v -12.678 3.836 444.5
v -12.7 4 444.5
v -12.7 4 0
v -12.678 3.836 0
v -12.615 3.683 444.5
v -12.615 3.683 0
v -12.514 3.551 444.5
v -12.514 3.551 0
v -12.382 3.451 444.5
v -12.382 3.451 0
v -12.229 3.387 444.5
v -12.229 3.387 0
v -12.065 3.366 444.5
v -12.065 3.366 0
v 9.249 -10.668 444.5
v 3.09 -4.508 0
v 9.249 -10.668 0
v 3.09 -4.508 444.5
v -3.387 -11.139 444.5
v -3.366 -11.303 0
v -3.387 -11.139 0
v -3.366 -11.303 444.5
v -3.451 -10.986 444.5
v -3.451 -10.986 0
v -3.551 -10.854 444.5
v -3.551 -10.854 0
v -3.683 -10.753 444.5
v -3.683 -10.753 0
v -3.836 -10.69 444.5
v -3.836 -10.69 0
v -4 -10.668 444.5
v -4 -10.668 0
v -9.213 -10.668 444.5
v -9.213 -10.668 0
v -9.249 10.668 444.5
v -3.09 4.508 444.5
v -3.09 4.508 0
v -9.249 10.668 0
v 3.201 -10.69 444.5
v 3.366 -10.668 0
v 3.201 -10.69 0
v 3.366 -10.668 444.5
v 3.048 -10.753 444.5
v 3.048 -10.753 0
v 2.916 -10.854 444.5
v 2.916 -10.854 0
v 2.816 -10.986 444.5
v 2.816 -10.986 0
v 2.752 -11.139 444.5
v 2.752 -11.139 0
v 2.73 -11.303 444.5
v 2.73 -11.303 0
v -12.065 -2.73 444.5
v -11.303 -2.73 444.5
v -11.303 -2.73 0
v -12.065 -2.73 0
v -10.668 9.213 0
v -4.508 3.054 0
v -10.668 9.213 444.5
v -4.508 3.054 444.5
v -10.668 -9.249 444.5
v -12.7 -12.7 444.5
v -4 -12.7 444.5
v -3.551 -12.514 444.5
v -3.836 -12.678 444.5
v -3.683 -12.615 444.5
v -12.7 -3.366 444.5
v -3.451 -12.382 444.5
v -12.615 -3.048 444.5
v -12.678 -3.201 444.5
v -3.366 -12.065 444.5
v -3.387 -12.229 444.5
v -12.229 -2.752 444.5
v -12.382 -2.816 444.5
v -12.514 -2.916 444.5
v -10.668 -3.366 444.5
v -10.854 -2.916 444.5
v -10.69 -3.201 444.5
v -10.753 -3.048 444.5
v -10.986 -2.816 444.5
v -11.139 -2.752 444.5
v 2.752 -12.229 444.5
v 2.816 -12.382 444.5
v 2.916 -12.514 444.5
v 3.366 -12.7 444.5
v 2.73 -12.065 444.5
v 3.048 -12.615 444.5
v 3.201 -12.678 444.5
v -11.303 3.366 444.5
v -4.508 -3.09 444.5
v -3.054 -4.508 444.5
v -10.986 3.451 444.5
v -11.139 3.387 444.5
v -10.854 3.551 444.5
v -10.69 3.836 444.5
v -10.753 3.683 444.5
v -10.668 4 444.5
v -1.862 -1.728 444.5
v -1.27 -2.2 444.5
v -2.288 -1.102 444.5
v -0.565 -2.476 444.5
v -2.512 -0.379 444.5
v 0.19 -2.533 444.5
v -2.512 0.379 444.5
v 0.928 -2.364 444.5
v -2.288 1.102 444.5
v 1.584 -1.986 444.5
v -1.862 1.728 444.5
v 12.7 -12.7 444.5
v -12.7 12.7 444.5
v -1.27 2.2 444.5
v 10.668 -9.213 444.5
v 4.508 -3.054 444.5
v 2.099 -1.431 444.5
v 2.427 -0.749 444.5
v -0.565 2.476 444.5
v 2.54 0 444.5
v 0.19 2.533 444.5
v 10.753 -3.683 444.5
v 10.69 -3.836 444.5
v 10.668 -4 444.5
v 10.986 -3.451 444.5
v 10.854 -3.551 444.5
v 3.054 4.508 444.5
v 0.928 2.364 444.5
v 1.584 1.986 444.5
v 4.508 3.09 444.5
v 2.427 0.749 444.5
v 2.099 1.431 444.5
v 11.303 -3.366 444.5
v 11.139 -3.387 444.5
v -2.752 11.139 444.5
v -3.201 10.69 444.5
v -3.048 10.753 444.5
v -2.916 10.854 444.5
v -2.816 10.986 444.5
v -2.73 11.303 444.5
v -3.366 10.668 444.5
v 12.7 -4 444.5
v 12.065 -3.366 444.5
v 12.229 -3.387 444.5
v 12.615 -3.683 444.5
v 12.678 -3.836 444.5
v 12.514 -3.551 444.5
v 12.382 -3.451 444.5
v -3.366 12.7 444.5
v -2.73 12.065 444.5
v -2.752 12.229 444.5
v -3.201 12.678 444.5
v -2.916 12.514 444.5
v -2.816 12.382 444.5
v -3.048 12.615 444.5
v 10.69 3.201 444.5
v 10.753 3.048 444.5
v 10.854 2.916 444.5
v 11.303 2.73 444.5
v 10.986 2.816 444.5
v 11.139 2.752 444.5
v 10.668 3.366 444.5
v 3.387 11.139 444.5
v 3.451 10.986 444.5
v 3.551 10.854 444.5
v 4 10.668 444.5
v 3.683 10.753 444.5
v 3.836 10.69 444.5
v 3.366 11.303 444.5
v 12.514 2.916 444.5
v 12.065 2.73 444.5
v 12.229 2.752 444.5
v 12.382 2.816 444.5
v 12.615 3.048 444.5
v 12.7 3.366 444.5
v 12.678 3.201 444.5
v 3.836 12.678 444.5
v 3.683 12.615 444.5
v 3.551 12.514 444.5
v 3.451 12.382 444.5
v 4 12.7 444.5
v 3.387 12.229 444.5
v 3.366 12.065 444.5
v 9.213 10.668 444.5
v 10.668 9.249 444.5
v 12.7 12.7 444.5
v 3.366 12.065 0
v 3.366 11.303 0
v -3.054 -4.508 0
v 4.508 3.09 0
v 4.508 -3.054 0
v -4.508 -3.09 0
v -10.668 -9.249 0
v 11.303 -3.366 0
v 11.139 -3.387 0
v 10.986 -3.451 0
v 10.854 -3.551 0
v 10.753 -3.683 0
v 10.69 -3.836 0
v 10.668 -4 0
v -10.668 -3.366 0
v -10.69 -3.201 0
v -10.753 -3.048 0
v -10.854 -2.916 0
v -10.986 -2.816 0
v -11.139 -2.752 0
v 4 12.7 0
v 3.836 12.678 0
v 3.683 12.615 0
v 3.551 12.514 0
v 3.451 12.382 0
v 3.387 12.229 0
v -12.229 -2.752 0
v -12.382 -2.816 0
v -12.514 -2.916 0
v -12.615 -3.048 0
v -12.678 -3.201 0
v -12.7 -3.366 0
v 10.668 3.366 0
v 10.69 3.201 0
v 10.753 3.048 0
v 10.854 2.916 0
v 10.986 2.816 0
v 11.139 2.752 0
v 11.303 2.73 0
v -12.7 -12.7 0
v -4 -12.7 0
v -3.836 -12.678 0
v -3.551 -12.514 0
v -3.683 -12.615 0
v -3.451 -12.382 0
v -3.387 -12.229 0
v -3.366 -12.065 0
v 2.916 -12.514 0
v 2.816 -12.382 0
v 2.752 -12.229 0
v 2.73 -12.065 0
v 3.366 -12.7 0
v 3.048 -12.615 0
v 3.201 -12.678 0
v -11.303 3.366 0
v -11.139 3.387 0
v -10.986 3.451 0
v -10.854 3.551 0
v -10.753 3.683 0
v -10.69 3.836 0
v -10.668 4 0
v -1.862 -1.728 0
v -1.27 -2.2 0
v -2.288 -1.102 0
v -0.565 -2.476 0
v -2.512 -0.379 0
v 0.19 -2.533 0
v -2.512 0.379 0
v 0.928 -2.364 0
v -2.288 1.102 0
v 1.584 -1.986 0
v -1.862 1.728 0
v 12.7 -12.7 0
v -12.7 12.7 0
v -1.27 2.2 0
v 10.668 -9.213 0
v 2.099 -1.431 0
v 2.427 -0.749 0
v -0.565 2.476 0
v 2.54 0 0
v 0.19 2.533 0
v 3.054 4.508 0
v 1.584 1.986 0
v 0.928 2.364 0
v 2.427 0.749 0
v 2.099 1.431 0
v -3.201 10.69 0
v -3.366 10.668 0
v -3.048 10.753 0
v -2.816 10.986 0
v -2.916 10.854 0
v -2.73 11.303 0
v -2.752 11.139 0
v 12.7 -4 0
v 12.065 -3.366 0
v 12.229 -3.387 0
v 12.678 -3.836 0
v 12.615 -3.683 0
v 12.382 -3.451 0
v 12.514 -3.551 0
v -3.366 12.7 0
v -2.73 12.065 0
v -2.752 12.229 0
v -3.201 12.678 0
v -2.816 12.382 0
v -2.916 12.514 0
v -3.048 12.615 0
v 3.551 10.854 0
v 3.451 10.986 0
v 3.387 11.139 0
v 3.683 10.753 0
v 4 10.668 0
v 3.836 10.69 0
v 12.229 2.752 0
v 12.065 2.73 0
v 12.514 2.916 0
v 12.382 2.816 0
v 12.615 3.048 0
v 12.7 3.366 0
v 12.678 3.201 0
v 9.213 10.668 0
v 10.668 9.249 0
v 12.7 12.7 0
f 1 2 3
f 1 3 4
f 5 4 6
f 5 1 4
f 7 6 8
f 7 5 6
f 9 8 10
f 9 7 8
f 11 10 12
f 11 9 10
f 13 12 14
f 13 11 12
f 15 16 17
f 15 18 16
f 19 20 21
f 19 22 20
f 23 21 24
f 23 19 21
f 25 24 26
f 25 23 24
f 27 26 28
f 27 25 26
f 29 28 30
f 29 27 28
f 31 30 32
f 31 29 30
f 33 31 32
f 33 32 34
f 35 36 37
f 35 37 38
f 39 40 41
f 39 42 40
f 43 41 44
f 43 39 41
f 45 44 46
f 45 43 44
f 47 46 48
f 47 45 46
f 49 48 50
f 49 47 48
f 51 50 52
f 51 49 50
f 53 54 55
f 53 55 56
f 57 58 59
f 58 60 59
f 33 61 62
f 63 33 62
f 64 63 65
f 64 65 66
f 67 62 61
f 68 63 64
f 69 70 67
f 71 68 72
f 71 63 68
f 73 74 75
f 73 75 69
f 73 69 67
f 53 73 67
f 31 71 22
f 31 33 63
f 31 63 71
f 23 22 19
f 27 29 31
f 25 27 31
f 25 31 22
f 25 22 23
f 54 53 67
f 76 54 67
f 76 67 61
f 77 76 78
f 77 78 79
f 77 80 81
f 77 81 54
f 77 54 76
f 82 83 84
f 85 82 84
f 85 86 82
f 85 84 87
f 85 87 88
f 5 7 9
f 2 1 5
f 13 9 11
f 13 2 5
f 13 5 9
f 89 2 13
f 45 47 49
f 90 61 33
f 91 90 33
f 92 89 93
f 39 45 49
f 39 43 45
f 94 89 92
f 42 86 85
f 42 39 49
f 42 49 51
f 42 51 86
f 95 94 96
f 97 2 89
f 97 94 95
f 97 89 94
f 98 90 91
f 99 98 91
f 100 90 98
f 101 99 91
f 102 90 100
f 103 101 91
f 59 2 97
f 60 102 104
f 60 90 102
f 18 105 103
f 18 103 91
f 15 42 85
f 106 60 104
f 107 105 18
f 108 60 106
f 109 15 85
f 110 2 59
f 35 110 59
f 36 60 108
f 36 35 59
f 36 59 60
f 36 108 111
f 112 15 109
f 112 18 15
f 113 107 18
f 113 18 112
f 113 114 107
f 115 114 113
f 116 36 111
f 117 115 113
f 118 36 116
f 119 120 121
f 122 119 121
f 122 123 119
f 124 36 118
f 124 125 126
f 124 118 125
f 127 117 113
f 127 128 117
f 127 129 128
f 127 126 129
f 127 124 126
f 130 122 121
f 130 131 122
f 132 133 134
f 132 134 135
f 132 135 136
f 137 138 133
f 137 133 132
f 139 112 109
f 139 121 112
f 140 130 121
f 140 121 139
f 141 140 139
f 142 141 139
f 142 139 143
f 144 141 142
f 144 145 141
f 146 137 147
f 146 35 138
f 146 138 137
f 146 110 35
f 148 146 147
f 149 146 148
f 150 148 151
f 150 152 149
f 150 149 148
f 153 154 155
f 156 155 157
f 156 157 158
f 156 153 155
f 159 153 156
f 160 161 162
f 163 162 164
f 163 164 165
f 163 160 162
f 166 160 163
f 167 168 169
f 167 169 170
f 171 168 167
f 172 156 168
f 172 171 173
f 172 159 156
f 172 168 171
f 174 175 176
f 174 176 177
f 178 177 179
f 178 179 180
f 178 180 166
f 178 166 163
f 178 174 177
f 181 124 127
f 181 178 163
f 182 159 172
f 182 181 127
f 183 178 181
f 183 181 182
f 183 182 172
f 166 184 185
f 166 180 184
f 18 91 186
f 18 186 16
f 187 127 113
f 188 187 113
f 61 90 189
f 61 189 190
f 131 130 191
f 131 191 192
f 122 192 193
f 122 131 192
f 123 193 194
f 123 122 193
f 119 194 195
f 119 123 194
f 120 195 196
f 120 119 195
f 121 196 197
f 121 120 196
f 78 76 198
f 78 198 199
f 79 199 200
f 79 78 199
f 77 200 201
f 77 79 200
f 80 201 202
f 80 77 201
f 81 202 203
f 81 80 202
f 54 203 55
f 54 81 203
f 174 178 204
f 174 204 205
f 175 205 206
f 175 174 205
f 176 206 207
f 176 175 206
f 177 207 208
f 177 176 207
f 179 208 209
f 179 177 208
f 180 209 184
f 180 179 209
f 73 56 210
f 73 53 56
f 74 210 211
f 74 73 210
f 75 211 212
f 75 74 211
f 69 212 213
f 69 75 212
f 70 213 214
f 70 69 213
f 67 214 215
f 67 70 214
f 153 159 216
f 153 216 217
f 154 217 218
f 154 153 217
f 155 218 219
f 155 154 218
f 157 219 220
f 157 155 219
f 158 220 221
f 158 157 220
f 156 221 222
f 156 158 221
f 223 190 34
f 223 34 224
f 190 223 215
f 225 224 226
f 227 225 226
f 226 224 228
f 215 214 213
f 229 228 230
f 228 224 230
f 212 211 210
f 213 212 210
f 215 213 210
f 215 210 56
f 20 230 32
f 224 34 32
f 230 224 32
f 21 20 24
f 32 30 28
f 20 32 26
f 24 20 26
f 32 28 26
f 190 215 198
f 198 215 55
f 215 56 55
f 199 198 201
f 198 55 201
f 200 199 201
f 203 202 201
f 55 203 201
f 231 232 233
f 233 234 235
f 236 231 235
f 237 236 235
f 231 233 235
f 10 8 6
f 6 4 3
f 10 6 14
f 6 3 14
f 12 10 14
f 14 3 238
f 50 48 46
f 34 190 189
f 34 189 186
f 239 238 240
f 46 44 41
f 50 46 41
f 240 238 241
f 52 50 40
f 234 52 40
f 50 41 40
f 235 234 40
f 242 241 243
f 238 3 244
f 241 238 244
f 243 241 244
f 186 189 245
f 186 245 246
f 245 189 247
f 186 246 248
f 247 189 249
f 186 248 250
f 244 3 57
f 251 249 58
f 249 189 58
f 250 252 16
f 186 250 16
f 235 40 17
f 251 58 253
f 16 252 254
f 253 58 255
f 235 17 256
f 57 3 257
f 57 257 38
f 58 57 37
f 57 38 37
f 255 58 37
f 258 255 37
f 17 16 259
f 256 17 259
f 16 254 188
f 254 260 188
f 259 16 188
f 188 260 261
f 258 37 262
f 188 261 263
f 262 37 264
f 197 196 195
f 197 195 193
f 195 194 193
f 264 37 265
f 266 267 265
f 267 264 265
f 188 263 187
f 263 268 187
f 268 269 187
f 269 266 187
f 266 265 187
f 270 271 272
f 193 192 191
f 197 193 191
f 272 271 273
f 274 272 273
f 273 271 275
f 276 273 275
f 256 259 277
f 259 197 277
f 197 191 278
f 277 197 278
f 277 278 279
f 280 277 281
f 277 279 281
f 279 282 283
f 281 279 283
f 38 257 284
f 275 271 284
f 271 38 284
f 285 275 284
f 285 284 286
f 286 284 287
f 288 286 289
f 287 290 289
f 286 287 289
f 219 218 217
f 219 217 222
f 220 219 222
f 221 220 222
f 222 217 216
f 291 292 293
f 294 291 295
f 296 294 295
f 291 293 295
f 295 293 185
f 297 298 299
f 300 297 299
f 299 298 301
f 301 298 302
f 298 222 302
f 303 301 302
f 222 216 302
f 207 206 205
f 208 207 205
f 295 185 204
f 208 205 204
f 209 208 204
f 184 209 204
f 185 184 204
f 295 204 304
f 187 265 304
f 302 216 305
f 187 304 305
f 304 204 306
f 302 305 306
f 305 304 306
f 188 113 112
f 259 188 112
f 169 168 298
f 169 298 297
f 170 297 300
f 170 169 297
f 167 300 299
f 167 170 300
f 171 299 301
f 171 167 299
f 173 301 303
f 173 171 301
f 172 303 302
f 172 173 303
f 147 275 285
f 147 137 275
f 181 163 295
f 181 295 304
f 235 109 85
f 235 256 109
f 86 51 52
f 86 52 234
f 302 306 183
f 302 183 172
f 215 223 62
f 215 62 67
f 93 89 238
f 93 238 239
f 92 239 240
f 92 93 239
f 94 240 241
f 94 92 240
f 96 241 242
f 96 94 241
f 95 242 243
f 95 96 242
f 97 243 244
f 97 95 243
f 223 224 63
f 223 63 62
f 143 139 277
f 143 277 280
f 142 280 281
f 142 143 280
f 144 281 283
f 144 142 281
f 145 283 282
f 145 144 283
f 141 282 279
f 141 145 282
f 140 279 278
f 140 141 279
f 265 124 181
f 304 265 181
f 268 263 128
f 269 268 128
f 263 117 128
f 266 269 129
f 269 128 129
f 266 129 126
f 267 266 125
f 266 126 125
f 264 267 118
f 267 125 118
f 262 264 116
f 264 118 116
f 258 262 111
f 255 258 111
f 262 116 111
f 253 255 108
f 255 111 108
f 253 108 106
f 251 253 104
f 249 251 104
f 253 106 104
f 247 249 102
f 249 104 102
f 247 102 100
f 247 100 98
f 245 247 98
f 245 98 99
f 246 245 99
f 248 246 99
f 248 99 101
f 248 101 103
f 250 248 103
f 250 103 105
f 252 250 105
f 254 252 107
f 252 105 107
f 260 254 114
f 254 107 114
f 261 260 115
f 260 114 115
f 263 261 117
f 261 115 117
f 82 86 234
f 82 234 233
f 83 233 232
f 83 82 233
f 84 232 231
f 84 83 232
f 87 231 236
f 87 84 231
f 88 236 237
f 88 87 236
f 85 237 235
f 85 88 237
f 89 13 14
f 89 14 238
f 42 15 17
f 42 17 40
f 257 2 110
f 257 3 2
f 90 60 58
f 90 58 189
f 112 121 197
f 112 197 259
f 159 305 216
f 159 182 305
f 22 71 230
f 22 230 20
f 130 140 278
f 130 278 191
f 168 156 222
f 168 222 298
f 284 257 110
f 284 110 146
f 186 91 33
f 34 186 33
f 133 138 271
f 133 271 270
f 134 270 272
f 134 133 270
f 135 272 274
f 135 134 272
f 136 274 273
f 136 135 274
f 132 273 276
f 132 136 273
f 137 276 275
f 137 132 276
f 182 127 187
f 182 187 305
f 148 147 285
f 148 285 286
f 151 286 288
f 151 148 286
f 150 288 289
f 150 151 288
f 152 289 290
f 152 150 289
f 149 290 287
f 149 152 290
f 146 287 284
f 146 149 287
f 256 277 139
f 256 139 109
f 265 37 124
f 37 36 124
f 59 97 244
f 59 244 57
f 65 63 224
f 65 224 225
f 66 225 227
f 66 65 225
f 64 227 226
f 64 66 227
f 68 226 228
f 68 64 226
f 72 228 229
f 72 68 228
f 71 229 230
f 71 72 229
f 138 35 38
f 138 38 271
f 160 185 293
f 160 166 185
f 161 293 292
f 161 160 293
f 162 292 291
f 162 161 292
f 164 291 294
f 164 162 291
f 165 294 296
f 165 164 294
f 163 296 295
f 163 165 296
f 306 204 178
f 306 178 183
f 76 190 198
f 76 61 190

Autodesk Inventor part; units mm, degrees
ref_plane "YZ Plane" through (0, 0, 0) normal (1, 0, 0) x (0, 1, 0)
ref_plane "XZ Plane" through (0, 0, 0) normal (0, 1, 0) x (-1, 0, 0)
ref_plane "XY Plane" through (0, 0, 0) normal (0, 0, 1) x (1, 0, 0)
sketch "Sketch1" plane through (0, 0, 0) normal (0, 0, 1) x (1, 0, 0)
  line L0 (-12.7, 12.7) -> (12.7, 12.7)
  line L1 (12.7, 12.7) -> (12.7, -12.7)
  line L2 (12.7, -12.7) -> (-12.7, -12.7)
  line L3 (-12.7, -12.7) -> (-12.7, 12.7)
  point P0 (0, 0)
  dimension "d0" = 25.4
  dimension "d1" = 25.4
  dimension "d2" = 12.7
  dimension "d3" = 12.7
extrude "Extrusion1" add sketch "Sketch1" along normal blind 444.5
sketch "Sketch2" plane through (0, 0, 444.5) normal (0, 0, 1) x (1, 0, 0)
  circle A0 centre (0, 0) radius 2.54
  line L0 (-4.5085, 4.5085) -> (4.5085, 4.5085)
  line L1 (-4.5085, -4.5085) -> (4.5085, -4.5085)
  line L2 (4.5085, 4.5085) -> (4.5085, -4.5085)
  line L3 (-4.5085, 4.5085) -> (-4.5085, -4.5085)
  line L4 (-3.0896, 4.5085) -> (-11.2811, 12.7)
  line L5 (-4.5085, 3.0537) -> (-12.7, 11.2452)
  line L6 (12.7, 12.7) -> (-12.7, 12.7) projected
  line L7 (-12.7, 12.7) -> (-12.7, 4.0005)
  line L8 (-10.668, 4.0005) -> (-10.668, 9.2132)
  line L9 (-9.2491, 10.668) -> (-3.3655, 10.668)
  line L10 (-12.7, 12.7) -> (-3.3655, 12.7)
  line L11 (-2.7305, 11.303) -> (-2.7305, 12.065)
  line L12 (-12.065, 3.3655) -> (-11.303, 3.3655)
  arc A1 (-12.7, 4.0005) -> (-12.065, 3.3655) centre (-12.065, 4.0005) ccw
  arc A2 (-11.303, 3.3655) -> (-10.668, 4.0005) centre (-11.303, 4.0005) ccw
  arc A3 (-3.3655, 10.668) -> (-2.7305, 11.303) centre (-3.3655, 11.303) ccw
  arc A4 (-2.7305, 12.065) -> (-3.3655, 12.7) centre (-3.3655, 12.065) ccw
  arc A5 (-3.3655, -11.303) -> (-4.0005, -10.668) centre (-4.0005, -11.303) ccw
  line L13 (-3.3655, -12.065) -> (-3.3655, -11.303)
  arc A6 (-4.0005, -12.7) -> (-3.3655, -12.065) centre (-4.0005, -12.065) ccw
  line L14 (-3.0537, -4.5085) -> (-11.2452, -12.7)
  line L15 (-10.668, -9.2491) -> (-10.668, -3.3655)
  line L16 (-4.5085, -3.0896) -> (-12.7, -11.2811)
  line L17 (-12.7, -12.7) -> (-12.7, -3.3655)
  arc A7 (-10.668, -3.3655) -> (-11.303, -2.7305) centre (-11.303, -3.3655) ccw
  line L18 (-11.303, -2.7305) -> (-12.065, -2.7305)
  arc A8 (-12.065, -2.7305) -> (-12.7, -3.3655) centre (-12.065, -3.3655) ccw
  line L19 (-4.0005, -10.668) -> (-9.2132, -10.668)
  line L20 (-12.7, -12.7) -> (-4.0005, -12.7)
  arc A9 (11.303, -3.3655) -> (10.668, -4.0005) centre (11.303, -4.0005) ccw
  line L21 (12.065, -3.3655) -> (11.303, -3.3655)
  arc A10 (12.7, -4.0005) -> (12.065, -3.3655) centre (12.065, -4.0005) ccw
  line L22 (4.5085, -3.0537) -> (12.7, -11.2452)
  line L23 (9.2491, -10.668) -> (3.3655, -10.668)
  line L24 (3.0896, -4.5085) -> (11.2811, -12.7)
  line L25 (12.7, -12.7) -> (3.3655, -12.7)
  arc A11 (3.3655, -10.668) -> (2.7305, -11.303) centre (3.3655, -11.303) ccw
  line L26 (2.7305, -11.303) -> (2.7305, -12.065)
  arc A12 (2.7305, -12.065) -> (3.3655, -12.7) centre (3.3655, -12.065) ccw
  line L27 (10.668, -4.0005) -> (10.668, -9.2132)
  line L28 (12.7, -12.7) -> (12.7, -4.0005)
  arc A13 (3.3655, 11.303) -> (4.0005, 10.668) centre (4.0005, 11.303) ccw
  line L29 (3.3655, 12.065) -> (3.3655, 11.303)
  arc A14 (4.0005, 12.7) -> (3.3655, 12.065) centre (4.0005, 12.065) ccw
  line L30 (3.0537, 4.5085) -> (11.2452, 12.7)
  line L31 (10.668, 9.2491) -> (10.668, 3.3655)
  line L32 (4.5085, 3.0896) -> (12.7, 11.2811)
  line L33 (12.7, 12.7) -> (12.7, 3.3655)
  arc A15 (10.668, 3.3655) -> (11.303, 2.7305) centre (11.303, 3.3655) ccw
  line L34 (11.303, 2.7305) -> (12.065, 2.7305)
  arc A16 (12.065, 2.7305) -> (12.7, 3.3655) centre (12.065, 3.3655) ccw
  line L35 (4.0005, 10.668) -> (9.2132, 10.668)
  line L36 (12.7, 12.7) -> (4.0005, 12.7)
  line L37 (-4.5085, 3.0537) -> (-4.5085, 4.5085)
  line L38 (-3.0896, 4.5085) -> (-4.5085, 4.5085)
  line L39 (-12.7, -12.7) -> (-4.0005, -12.7)
  line L40 (-4.0005, -10.668) -> (-9.2132, -10.668)
  line L41 (-10.668, -9.2491) -> (-10.668, -3.3655)
  line L42 (-12.7, -12.7) -> (-12.7, -3.3655)
  line L43 (-11.303, -2.7305) -> (-12.065, -2.7305)
  arc A17 (-10.668, -3.3655) -> (-11.303, -2.7305) centre (-11.303, -3.3655) ccw
  arc A18 (-12.065, -2.7305) -> (-12.7, -3.3655) centre (-12.065, -3.3655) ccw
  line L44 (-4.5085, -3.0896) -> (-4.5085, -4.5085)
  line L45 (-4.5085, -3.0896) -> (-12.7, -11.2811)
  line L46 (-3.0537, -4.5085) -> (-4.5085, -4.5085)
  line L47 (-3.0537, -4.5085) -> (-11.2452, -12.7)
  line L48 (-4.5085, -4.5085) -> (-4.5085, 4.5085)
  circle A19 centre (0, 0) radius 2.54
  line L49 (-4.5085, -4.5085) -> (4.5085, -4.5085)
  line L50 (-3.3655, -12.065) -> (-3.3655, -11.303)
  arc A20 (-4.0005, -12.7) -> (-3.3655, -12.065) centre (-4.0005, -12.065) ccw
  arc A21 (-3.3655, -11.303) -> (-4.0005, -10.668) centre (-4.0005, -11.303) ccw
  line L51 (12.7, -12.7) -> (12.7, -4.0005)
  line L52 (10.668, -4.0005) -> (10.668, -9.2132)
  line L53 (9.2491, -10.668) -> (3.3655, -10.668)
  line L54 (12.7, -12.7) -> (3.3655, -12.7)
  line L55 (2.7305, -11.303) -> (2.7305, -12.065)
  arc A22 (3.3655, -10.668) -> (2.7305, -11.303) centre (3.3655, -11.303) ccw
  arc A23 (2.7305, -12.065) -> (3.3655, -12.7) centre (3.3655, -12.065) ccw
  line L56 (3.0896, -4.5085) -> (4.5085, -4.5085)
  line L57 (3.0896, -4.5085) -> (11.2811, -12.7)
  line L58 (4.5085, -3.0537) -> (4.5085, -4.5085)
  line L59 (4.5085, -3.0537) -> (12.7, -11.2452)
  line L60 (4.5085, -4.5085) -> (-4.5085, -4.5085)
  circle A24 centre (0, 0) radius 2.54
  line L61 (4.5085, -4.5085) -> (4.5085, 4.5085)
  line L62 (12.065, -3.3655) -> (11.303, -3.3655)
  arc A25 (12.7, -4.0005) -> (12.065, -3.3655) centre (12.065, -4.0005) ccw
  arc A26 (11.303, -3.3655) -> (10.668, -4.0005) centre (11.303, -4.0005) ccw
  line L63 (12.7, 12.7) -> (4.0005, 12.7)
  line L64 (4.0005, 10.668) -> (9.2132, 10.668)
  line L65 (10.668, 9.2491) -> (10.668, 3.3655)
  line L66 (12.7, 12.7) -> (12.7, 3.3655)
  line L67 (11.303, 2.7305) -> (12.065, 2.7305)
  arc A27 (10.668, 3.3655) -> (11.303, 2.7305) centre (11.303, 3.3655) ccw
  arc A28 (12.065, 2.7305) -> (12.7, 3.3655) centre (12.065, 3.3655) ccw
  line L68 (4.5085, 3.0896) -> (4.5085, 4.5085)
  line L69 (4.5085, 3.0896) -> (12.7, 11.2811)
  line L70 (3.0537, 4.5085) -> (4.5085, 4.5085)
  line L71 (3.0537, 4.5085) -> (11.2452, 12.7)
  line L72 (4.5085, 4.5085) -> (4.5085, -4.5085)
  circle A29 centre (0, 0) radius 2.54
  line L73 (4.5085, 4.5085) -> (-4.5085, 4.5085)
  line L74 (3.3655, 12.065) -> (3.3655, 11.303)
  arc A30 (4.0005, 12.7) -> (3.3655, 12.065) centre (4.0005, 12.065) ccw
  arc A31 (3.3655, 11.303) -> (4.0005, 10.668) centre (4.0005, 11.303) ccw
  point P0 (-12.7, 3.3655)
  point P1 (-2.7305, 12.7)
  point P2 (-3.3655, -12.7)
  point P3 (-12.7, -2.7305)
  point P4 (12.7, -3.3655)
  point P5 (2.7305, -12.7)
  point P6 (3.3655, 12.7)
  point P7 (12.7, 2.7305)
  point P8 (-3.3655, -12.7)
  point P9 (-12.7, -2.7305)
  point P10 (12.7, -3.3655)
  point P11 (2.7305, -12.7)
  point P12 (3.3655, 12.7)
  point P13 (12.7, 2.7305)
  dimension "d6" = 5.08
  dimension "d7" = 9.017
  dimension "d8" = 4.5085
  dimension "d9" = 4.5085
  dimension "d10" = 4.5085
  dimension "d11" = 2.032
  dimension "d12" = 1.0033
  dimension "d13" = 135
  dimension "d17" = 9.3345
  dimension "d19" = 2.032
  dimension "d20" = 2.032
  dimension "d21" = 0.635
  dimension "d22" = 9.3345
  dimension "d25" = 360
  dimension "d29" = 360
extrude "Extrusion2" cut sketch "Sketch2" against normal blind 1219.2 contours L3 L5 L7 L6 L4 L0 | L0 L2 L1 L3 | L30 L6 L33 L32 L2 L0 | L4 L6 A4 L11 A3 L9 | L3 L1 L14 L20 L17 L16 | L8 A2 L12 A1 L7 L5 | L35 A13 L29 A14 L6 L30 | L16 L17 A8 L18 A7 L15 | L22 L28 L25 L24 L1 L2 | L32 L33 A16 L34 A15 L31 | L19 A5 L13 A6 L20 L14 | L27 A9 L21 A10 L28 L22 | L24 L25 A12 L26 A11 L23 keep common part
equation "\"d22\" = d17"
properties part number "Outside side vertical"
